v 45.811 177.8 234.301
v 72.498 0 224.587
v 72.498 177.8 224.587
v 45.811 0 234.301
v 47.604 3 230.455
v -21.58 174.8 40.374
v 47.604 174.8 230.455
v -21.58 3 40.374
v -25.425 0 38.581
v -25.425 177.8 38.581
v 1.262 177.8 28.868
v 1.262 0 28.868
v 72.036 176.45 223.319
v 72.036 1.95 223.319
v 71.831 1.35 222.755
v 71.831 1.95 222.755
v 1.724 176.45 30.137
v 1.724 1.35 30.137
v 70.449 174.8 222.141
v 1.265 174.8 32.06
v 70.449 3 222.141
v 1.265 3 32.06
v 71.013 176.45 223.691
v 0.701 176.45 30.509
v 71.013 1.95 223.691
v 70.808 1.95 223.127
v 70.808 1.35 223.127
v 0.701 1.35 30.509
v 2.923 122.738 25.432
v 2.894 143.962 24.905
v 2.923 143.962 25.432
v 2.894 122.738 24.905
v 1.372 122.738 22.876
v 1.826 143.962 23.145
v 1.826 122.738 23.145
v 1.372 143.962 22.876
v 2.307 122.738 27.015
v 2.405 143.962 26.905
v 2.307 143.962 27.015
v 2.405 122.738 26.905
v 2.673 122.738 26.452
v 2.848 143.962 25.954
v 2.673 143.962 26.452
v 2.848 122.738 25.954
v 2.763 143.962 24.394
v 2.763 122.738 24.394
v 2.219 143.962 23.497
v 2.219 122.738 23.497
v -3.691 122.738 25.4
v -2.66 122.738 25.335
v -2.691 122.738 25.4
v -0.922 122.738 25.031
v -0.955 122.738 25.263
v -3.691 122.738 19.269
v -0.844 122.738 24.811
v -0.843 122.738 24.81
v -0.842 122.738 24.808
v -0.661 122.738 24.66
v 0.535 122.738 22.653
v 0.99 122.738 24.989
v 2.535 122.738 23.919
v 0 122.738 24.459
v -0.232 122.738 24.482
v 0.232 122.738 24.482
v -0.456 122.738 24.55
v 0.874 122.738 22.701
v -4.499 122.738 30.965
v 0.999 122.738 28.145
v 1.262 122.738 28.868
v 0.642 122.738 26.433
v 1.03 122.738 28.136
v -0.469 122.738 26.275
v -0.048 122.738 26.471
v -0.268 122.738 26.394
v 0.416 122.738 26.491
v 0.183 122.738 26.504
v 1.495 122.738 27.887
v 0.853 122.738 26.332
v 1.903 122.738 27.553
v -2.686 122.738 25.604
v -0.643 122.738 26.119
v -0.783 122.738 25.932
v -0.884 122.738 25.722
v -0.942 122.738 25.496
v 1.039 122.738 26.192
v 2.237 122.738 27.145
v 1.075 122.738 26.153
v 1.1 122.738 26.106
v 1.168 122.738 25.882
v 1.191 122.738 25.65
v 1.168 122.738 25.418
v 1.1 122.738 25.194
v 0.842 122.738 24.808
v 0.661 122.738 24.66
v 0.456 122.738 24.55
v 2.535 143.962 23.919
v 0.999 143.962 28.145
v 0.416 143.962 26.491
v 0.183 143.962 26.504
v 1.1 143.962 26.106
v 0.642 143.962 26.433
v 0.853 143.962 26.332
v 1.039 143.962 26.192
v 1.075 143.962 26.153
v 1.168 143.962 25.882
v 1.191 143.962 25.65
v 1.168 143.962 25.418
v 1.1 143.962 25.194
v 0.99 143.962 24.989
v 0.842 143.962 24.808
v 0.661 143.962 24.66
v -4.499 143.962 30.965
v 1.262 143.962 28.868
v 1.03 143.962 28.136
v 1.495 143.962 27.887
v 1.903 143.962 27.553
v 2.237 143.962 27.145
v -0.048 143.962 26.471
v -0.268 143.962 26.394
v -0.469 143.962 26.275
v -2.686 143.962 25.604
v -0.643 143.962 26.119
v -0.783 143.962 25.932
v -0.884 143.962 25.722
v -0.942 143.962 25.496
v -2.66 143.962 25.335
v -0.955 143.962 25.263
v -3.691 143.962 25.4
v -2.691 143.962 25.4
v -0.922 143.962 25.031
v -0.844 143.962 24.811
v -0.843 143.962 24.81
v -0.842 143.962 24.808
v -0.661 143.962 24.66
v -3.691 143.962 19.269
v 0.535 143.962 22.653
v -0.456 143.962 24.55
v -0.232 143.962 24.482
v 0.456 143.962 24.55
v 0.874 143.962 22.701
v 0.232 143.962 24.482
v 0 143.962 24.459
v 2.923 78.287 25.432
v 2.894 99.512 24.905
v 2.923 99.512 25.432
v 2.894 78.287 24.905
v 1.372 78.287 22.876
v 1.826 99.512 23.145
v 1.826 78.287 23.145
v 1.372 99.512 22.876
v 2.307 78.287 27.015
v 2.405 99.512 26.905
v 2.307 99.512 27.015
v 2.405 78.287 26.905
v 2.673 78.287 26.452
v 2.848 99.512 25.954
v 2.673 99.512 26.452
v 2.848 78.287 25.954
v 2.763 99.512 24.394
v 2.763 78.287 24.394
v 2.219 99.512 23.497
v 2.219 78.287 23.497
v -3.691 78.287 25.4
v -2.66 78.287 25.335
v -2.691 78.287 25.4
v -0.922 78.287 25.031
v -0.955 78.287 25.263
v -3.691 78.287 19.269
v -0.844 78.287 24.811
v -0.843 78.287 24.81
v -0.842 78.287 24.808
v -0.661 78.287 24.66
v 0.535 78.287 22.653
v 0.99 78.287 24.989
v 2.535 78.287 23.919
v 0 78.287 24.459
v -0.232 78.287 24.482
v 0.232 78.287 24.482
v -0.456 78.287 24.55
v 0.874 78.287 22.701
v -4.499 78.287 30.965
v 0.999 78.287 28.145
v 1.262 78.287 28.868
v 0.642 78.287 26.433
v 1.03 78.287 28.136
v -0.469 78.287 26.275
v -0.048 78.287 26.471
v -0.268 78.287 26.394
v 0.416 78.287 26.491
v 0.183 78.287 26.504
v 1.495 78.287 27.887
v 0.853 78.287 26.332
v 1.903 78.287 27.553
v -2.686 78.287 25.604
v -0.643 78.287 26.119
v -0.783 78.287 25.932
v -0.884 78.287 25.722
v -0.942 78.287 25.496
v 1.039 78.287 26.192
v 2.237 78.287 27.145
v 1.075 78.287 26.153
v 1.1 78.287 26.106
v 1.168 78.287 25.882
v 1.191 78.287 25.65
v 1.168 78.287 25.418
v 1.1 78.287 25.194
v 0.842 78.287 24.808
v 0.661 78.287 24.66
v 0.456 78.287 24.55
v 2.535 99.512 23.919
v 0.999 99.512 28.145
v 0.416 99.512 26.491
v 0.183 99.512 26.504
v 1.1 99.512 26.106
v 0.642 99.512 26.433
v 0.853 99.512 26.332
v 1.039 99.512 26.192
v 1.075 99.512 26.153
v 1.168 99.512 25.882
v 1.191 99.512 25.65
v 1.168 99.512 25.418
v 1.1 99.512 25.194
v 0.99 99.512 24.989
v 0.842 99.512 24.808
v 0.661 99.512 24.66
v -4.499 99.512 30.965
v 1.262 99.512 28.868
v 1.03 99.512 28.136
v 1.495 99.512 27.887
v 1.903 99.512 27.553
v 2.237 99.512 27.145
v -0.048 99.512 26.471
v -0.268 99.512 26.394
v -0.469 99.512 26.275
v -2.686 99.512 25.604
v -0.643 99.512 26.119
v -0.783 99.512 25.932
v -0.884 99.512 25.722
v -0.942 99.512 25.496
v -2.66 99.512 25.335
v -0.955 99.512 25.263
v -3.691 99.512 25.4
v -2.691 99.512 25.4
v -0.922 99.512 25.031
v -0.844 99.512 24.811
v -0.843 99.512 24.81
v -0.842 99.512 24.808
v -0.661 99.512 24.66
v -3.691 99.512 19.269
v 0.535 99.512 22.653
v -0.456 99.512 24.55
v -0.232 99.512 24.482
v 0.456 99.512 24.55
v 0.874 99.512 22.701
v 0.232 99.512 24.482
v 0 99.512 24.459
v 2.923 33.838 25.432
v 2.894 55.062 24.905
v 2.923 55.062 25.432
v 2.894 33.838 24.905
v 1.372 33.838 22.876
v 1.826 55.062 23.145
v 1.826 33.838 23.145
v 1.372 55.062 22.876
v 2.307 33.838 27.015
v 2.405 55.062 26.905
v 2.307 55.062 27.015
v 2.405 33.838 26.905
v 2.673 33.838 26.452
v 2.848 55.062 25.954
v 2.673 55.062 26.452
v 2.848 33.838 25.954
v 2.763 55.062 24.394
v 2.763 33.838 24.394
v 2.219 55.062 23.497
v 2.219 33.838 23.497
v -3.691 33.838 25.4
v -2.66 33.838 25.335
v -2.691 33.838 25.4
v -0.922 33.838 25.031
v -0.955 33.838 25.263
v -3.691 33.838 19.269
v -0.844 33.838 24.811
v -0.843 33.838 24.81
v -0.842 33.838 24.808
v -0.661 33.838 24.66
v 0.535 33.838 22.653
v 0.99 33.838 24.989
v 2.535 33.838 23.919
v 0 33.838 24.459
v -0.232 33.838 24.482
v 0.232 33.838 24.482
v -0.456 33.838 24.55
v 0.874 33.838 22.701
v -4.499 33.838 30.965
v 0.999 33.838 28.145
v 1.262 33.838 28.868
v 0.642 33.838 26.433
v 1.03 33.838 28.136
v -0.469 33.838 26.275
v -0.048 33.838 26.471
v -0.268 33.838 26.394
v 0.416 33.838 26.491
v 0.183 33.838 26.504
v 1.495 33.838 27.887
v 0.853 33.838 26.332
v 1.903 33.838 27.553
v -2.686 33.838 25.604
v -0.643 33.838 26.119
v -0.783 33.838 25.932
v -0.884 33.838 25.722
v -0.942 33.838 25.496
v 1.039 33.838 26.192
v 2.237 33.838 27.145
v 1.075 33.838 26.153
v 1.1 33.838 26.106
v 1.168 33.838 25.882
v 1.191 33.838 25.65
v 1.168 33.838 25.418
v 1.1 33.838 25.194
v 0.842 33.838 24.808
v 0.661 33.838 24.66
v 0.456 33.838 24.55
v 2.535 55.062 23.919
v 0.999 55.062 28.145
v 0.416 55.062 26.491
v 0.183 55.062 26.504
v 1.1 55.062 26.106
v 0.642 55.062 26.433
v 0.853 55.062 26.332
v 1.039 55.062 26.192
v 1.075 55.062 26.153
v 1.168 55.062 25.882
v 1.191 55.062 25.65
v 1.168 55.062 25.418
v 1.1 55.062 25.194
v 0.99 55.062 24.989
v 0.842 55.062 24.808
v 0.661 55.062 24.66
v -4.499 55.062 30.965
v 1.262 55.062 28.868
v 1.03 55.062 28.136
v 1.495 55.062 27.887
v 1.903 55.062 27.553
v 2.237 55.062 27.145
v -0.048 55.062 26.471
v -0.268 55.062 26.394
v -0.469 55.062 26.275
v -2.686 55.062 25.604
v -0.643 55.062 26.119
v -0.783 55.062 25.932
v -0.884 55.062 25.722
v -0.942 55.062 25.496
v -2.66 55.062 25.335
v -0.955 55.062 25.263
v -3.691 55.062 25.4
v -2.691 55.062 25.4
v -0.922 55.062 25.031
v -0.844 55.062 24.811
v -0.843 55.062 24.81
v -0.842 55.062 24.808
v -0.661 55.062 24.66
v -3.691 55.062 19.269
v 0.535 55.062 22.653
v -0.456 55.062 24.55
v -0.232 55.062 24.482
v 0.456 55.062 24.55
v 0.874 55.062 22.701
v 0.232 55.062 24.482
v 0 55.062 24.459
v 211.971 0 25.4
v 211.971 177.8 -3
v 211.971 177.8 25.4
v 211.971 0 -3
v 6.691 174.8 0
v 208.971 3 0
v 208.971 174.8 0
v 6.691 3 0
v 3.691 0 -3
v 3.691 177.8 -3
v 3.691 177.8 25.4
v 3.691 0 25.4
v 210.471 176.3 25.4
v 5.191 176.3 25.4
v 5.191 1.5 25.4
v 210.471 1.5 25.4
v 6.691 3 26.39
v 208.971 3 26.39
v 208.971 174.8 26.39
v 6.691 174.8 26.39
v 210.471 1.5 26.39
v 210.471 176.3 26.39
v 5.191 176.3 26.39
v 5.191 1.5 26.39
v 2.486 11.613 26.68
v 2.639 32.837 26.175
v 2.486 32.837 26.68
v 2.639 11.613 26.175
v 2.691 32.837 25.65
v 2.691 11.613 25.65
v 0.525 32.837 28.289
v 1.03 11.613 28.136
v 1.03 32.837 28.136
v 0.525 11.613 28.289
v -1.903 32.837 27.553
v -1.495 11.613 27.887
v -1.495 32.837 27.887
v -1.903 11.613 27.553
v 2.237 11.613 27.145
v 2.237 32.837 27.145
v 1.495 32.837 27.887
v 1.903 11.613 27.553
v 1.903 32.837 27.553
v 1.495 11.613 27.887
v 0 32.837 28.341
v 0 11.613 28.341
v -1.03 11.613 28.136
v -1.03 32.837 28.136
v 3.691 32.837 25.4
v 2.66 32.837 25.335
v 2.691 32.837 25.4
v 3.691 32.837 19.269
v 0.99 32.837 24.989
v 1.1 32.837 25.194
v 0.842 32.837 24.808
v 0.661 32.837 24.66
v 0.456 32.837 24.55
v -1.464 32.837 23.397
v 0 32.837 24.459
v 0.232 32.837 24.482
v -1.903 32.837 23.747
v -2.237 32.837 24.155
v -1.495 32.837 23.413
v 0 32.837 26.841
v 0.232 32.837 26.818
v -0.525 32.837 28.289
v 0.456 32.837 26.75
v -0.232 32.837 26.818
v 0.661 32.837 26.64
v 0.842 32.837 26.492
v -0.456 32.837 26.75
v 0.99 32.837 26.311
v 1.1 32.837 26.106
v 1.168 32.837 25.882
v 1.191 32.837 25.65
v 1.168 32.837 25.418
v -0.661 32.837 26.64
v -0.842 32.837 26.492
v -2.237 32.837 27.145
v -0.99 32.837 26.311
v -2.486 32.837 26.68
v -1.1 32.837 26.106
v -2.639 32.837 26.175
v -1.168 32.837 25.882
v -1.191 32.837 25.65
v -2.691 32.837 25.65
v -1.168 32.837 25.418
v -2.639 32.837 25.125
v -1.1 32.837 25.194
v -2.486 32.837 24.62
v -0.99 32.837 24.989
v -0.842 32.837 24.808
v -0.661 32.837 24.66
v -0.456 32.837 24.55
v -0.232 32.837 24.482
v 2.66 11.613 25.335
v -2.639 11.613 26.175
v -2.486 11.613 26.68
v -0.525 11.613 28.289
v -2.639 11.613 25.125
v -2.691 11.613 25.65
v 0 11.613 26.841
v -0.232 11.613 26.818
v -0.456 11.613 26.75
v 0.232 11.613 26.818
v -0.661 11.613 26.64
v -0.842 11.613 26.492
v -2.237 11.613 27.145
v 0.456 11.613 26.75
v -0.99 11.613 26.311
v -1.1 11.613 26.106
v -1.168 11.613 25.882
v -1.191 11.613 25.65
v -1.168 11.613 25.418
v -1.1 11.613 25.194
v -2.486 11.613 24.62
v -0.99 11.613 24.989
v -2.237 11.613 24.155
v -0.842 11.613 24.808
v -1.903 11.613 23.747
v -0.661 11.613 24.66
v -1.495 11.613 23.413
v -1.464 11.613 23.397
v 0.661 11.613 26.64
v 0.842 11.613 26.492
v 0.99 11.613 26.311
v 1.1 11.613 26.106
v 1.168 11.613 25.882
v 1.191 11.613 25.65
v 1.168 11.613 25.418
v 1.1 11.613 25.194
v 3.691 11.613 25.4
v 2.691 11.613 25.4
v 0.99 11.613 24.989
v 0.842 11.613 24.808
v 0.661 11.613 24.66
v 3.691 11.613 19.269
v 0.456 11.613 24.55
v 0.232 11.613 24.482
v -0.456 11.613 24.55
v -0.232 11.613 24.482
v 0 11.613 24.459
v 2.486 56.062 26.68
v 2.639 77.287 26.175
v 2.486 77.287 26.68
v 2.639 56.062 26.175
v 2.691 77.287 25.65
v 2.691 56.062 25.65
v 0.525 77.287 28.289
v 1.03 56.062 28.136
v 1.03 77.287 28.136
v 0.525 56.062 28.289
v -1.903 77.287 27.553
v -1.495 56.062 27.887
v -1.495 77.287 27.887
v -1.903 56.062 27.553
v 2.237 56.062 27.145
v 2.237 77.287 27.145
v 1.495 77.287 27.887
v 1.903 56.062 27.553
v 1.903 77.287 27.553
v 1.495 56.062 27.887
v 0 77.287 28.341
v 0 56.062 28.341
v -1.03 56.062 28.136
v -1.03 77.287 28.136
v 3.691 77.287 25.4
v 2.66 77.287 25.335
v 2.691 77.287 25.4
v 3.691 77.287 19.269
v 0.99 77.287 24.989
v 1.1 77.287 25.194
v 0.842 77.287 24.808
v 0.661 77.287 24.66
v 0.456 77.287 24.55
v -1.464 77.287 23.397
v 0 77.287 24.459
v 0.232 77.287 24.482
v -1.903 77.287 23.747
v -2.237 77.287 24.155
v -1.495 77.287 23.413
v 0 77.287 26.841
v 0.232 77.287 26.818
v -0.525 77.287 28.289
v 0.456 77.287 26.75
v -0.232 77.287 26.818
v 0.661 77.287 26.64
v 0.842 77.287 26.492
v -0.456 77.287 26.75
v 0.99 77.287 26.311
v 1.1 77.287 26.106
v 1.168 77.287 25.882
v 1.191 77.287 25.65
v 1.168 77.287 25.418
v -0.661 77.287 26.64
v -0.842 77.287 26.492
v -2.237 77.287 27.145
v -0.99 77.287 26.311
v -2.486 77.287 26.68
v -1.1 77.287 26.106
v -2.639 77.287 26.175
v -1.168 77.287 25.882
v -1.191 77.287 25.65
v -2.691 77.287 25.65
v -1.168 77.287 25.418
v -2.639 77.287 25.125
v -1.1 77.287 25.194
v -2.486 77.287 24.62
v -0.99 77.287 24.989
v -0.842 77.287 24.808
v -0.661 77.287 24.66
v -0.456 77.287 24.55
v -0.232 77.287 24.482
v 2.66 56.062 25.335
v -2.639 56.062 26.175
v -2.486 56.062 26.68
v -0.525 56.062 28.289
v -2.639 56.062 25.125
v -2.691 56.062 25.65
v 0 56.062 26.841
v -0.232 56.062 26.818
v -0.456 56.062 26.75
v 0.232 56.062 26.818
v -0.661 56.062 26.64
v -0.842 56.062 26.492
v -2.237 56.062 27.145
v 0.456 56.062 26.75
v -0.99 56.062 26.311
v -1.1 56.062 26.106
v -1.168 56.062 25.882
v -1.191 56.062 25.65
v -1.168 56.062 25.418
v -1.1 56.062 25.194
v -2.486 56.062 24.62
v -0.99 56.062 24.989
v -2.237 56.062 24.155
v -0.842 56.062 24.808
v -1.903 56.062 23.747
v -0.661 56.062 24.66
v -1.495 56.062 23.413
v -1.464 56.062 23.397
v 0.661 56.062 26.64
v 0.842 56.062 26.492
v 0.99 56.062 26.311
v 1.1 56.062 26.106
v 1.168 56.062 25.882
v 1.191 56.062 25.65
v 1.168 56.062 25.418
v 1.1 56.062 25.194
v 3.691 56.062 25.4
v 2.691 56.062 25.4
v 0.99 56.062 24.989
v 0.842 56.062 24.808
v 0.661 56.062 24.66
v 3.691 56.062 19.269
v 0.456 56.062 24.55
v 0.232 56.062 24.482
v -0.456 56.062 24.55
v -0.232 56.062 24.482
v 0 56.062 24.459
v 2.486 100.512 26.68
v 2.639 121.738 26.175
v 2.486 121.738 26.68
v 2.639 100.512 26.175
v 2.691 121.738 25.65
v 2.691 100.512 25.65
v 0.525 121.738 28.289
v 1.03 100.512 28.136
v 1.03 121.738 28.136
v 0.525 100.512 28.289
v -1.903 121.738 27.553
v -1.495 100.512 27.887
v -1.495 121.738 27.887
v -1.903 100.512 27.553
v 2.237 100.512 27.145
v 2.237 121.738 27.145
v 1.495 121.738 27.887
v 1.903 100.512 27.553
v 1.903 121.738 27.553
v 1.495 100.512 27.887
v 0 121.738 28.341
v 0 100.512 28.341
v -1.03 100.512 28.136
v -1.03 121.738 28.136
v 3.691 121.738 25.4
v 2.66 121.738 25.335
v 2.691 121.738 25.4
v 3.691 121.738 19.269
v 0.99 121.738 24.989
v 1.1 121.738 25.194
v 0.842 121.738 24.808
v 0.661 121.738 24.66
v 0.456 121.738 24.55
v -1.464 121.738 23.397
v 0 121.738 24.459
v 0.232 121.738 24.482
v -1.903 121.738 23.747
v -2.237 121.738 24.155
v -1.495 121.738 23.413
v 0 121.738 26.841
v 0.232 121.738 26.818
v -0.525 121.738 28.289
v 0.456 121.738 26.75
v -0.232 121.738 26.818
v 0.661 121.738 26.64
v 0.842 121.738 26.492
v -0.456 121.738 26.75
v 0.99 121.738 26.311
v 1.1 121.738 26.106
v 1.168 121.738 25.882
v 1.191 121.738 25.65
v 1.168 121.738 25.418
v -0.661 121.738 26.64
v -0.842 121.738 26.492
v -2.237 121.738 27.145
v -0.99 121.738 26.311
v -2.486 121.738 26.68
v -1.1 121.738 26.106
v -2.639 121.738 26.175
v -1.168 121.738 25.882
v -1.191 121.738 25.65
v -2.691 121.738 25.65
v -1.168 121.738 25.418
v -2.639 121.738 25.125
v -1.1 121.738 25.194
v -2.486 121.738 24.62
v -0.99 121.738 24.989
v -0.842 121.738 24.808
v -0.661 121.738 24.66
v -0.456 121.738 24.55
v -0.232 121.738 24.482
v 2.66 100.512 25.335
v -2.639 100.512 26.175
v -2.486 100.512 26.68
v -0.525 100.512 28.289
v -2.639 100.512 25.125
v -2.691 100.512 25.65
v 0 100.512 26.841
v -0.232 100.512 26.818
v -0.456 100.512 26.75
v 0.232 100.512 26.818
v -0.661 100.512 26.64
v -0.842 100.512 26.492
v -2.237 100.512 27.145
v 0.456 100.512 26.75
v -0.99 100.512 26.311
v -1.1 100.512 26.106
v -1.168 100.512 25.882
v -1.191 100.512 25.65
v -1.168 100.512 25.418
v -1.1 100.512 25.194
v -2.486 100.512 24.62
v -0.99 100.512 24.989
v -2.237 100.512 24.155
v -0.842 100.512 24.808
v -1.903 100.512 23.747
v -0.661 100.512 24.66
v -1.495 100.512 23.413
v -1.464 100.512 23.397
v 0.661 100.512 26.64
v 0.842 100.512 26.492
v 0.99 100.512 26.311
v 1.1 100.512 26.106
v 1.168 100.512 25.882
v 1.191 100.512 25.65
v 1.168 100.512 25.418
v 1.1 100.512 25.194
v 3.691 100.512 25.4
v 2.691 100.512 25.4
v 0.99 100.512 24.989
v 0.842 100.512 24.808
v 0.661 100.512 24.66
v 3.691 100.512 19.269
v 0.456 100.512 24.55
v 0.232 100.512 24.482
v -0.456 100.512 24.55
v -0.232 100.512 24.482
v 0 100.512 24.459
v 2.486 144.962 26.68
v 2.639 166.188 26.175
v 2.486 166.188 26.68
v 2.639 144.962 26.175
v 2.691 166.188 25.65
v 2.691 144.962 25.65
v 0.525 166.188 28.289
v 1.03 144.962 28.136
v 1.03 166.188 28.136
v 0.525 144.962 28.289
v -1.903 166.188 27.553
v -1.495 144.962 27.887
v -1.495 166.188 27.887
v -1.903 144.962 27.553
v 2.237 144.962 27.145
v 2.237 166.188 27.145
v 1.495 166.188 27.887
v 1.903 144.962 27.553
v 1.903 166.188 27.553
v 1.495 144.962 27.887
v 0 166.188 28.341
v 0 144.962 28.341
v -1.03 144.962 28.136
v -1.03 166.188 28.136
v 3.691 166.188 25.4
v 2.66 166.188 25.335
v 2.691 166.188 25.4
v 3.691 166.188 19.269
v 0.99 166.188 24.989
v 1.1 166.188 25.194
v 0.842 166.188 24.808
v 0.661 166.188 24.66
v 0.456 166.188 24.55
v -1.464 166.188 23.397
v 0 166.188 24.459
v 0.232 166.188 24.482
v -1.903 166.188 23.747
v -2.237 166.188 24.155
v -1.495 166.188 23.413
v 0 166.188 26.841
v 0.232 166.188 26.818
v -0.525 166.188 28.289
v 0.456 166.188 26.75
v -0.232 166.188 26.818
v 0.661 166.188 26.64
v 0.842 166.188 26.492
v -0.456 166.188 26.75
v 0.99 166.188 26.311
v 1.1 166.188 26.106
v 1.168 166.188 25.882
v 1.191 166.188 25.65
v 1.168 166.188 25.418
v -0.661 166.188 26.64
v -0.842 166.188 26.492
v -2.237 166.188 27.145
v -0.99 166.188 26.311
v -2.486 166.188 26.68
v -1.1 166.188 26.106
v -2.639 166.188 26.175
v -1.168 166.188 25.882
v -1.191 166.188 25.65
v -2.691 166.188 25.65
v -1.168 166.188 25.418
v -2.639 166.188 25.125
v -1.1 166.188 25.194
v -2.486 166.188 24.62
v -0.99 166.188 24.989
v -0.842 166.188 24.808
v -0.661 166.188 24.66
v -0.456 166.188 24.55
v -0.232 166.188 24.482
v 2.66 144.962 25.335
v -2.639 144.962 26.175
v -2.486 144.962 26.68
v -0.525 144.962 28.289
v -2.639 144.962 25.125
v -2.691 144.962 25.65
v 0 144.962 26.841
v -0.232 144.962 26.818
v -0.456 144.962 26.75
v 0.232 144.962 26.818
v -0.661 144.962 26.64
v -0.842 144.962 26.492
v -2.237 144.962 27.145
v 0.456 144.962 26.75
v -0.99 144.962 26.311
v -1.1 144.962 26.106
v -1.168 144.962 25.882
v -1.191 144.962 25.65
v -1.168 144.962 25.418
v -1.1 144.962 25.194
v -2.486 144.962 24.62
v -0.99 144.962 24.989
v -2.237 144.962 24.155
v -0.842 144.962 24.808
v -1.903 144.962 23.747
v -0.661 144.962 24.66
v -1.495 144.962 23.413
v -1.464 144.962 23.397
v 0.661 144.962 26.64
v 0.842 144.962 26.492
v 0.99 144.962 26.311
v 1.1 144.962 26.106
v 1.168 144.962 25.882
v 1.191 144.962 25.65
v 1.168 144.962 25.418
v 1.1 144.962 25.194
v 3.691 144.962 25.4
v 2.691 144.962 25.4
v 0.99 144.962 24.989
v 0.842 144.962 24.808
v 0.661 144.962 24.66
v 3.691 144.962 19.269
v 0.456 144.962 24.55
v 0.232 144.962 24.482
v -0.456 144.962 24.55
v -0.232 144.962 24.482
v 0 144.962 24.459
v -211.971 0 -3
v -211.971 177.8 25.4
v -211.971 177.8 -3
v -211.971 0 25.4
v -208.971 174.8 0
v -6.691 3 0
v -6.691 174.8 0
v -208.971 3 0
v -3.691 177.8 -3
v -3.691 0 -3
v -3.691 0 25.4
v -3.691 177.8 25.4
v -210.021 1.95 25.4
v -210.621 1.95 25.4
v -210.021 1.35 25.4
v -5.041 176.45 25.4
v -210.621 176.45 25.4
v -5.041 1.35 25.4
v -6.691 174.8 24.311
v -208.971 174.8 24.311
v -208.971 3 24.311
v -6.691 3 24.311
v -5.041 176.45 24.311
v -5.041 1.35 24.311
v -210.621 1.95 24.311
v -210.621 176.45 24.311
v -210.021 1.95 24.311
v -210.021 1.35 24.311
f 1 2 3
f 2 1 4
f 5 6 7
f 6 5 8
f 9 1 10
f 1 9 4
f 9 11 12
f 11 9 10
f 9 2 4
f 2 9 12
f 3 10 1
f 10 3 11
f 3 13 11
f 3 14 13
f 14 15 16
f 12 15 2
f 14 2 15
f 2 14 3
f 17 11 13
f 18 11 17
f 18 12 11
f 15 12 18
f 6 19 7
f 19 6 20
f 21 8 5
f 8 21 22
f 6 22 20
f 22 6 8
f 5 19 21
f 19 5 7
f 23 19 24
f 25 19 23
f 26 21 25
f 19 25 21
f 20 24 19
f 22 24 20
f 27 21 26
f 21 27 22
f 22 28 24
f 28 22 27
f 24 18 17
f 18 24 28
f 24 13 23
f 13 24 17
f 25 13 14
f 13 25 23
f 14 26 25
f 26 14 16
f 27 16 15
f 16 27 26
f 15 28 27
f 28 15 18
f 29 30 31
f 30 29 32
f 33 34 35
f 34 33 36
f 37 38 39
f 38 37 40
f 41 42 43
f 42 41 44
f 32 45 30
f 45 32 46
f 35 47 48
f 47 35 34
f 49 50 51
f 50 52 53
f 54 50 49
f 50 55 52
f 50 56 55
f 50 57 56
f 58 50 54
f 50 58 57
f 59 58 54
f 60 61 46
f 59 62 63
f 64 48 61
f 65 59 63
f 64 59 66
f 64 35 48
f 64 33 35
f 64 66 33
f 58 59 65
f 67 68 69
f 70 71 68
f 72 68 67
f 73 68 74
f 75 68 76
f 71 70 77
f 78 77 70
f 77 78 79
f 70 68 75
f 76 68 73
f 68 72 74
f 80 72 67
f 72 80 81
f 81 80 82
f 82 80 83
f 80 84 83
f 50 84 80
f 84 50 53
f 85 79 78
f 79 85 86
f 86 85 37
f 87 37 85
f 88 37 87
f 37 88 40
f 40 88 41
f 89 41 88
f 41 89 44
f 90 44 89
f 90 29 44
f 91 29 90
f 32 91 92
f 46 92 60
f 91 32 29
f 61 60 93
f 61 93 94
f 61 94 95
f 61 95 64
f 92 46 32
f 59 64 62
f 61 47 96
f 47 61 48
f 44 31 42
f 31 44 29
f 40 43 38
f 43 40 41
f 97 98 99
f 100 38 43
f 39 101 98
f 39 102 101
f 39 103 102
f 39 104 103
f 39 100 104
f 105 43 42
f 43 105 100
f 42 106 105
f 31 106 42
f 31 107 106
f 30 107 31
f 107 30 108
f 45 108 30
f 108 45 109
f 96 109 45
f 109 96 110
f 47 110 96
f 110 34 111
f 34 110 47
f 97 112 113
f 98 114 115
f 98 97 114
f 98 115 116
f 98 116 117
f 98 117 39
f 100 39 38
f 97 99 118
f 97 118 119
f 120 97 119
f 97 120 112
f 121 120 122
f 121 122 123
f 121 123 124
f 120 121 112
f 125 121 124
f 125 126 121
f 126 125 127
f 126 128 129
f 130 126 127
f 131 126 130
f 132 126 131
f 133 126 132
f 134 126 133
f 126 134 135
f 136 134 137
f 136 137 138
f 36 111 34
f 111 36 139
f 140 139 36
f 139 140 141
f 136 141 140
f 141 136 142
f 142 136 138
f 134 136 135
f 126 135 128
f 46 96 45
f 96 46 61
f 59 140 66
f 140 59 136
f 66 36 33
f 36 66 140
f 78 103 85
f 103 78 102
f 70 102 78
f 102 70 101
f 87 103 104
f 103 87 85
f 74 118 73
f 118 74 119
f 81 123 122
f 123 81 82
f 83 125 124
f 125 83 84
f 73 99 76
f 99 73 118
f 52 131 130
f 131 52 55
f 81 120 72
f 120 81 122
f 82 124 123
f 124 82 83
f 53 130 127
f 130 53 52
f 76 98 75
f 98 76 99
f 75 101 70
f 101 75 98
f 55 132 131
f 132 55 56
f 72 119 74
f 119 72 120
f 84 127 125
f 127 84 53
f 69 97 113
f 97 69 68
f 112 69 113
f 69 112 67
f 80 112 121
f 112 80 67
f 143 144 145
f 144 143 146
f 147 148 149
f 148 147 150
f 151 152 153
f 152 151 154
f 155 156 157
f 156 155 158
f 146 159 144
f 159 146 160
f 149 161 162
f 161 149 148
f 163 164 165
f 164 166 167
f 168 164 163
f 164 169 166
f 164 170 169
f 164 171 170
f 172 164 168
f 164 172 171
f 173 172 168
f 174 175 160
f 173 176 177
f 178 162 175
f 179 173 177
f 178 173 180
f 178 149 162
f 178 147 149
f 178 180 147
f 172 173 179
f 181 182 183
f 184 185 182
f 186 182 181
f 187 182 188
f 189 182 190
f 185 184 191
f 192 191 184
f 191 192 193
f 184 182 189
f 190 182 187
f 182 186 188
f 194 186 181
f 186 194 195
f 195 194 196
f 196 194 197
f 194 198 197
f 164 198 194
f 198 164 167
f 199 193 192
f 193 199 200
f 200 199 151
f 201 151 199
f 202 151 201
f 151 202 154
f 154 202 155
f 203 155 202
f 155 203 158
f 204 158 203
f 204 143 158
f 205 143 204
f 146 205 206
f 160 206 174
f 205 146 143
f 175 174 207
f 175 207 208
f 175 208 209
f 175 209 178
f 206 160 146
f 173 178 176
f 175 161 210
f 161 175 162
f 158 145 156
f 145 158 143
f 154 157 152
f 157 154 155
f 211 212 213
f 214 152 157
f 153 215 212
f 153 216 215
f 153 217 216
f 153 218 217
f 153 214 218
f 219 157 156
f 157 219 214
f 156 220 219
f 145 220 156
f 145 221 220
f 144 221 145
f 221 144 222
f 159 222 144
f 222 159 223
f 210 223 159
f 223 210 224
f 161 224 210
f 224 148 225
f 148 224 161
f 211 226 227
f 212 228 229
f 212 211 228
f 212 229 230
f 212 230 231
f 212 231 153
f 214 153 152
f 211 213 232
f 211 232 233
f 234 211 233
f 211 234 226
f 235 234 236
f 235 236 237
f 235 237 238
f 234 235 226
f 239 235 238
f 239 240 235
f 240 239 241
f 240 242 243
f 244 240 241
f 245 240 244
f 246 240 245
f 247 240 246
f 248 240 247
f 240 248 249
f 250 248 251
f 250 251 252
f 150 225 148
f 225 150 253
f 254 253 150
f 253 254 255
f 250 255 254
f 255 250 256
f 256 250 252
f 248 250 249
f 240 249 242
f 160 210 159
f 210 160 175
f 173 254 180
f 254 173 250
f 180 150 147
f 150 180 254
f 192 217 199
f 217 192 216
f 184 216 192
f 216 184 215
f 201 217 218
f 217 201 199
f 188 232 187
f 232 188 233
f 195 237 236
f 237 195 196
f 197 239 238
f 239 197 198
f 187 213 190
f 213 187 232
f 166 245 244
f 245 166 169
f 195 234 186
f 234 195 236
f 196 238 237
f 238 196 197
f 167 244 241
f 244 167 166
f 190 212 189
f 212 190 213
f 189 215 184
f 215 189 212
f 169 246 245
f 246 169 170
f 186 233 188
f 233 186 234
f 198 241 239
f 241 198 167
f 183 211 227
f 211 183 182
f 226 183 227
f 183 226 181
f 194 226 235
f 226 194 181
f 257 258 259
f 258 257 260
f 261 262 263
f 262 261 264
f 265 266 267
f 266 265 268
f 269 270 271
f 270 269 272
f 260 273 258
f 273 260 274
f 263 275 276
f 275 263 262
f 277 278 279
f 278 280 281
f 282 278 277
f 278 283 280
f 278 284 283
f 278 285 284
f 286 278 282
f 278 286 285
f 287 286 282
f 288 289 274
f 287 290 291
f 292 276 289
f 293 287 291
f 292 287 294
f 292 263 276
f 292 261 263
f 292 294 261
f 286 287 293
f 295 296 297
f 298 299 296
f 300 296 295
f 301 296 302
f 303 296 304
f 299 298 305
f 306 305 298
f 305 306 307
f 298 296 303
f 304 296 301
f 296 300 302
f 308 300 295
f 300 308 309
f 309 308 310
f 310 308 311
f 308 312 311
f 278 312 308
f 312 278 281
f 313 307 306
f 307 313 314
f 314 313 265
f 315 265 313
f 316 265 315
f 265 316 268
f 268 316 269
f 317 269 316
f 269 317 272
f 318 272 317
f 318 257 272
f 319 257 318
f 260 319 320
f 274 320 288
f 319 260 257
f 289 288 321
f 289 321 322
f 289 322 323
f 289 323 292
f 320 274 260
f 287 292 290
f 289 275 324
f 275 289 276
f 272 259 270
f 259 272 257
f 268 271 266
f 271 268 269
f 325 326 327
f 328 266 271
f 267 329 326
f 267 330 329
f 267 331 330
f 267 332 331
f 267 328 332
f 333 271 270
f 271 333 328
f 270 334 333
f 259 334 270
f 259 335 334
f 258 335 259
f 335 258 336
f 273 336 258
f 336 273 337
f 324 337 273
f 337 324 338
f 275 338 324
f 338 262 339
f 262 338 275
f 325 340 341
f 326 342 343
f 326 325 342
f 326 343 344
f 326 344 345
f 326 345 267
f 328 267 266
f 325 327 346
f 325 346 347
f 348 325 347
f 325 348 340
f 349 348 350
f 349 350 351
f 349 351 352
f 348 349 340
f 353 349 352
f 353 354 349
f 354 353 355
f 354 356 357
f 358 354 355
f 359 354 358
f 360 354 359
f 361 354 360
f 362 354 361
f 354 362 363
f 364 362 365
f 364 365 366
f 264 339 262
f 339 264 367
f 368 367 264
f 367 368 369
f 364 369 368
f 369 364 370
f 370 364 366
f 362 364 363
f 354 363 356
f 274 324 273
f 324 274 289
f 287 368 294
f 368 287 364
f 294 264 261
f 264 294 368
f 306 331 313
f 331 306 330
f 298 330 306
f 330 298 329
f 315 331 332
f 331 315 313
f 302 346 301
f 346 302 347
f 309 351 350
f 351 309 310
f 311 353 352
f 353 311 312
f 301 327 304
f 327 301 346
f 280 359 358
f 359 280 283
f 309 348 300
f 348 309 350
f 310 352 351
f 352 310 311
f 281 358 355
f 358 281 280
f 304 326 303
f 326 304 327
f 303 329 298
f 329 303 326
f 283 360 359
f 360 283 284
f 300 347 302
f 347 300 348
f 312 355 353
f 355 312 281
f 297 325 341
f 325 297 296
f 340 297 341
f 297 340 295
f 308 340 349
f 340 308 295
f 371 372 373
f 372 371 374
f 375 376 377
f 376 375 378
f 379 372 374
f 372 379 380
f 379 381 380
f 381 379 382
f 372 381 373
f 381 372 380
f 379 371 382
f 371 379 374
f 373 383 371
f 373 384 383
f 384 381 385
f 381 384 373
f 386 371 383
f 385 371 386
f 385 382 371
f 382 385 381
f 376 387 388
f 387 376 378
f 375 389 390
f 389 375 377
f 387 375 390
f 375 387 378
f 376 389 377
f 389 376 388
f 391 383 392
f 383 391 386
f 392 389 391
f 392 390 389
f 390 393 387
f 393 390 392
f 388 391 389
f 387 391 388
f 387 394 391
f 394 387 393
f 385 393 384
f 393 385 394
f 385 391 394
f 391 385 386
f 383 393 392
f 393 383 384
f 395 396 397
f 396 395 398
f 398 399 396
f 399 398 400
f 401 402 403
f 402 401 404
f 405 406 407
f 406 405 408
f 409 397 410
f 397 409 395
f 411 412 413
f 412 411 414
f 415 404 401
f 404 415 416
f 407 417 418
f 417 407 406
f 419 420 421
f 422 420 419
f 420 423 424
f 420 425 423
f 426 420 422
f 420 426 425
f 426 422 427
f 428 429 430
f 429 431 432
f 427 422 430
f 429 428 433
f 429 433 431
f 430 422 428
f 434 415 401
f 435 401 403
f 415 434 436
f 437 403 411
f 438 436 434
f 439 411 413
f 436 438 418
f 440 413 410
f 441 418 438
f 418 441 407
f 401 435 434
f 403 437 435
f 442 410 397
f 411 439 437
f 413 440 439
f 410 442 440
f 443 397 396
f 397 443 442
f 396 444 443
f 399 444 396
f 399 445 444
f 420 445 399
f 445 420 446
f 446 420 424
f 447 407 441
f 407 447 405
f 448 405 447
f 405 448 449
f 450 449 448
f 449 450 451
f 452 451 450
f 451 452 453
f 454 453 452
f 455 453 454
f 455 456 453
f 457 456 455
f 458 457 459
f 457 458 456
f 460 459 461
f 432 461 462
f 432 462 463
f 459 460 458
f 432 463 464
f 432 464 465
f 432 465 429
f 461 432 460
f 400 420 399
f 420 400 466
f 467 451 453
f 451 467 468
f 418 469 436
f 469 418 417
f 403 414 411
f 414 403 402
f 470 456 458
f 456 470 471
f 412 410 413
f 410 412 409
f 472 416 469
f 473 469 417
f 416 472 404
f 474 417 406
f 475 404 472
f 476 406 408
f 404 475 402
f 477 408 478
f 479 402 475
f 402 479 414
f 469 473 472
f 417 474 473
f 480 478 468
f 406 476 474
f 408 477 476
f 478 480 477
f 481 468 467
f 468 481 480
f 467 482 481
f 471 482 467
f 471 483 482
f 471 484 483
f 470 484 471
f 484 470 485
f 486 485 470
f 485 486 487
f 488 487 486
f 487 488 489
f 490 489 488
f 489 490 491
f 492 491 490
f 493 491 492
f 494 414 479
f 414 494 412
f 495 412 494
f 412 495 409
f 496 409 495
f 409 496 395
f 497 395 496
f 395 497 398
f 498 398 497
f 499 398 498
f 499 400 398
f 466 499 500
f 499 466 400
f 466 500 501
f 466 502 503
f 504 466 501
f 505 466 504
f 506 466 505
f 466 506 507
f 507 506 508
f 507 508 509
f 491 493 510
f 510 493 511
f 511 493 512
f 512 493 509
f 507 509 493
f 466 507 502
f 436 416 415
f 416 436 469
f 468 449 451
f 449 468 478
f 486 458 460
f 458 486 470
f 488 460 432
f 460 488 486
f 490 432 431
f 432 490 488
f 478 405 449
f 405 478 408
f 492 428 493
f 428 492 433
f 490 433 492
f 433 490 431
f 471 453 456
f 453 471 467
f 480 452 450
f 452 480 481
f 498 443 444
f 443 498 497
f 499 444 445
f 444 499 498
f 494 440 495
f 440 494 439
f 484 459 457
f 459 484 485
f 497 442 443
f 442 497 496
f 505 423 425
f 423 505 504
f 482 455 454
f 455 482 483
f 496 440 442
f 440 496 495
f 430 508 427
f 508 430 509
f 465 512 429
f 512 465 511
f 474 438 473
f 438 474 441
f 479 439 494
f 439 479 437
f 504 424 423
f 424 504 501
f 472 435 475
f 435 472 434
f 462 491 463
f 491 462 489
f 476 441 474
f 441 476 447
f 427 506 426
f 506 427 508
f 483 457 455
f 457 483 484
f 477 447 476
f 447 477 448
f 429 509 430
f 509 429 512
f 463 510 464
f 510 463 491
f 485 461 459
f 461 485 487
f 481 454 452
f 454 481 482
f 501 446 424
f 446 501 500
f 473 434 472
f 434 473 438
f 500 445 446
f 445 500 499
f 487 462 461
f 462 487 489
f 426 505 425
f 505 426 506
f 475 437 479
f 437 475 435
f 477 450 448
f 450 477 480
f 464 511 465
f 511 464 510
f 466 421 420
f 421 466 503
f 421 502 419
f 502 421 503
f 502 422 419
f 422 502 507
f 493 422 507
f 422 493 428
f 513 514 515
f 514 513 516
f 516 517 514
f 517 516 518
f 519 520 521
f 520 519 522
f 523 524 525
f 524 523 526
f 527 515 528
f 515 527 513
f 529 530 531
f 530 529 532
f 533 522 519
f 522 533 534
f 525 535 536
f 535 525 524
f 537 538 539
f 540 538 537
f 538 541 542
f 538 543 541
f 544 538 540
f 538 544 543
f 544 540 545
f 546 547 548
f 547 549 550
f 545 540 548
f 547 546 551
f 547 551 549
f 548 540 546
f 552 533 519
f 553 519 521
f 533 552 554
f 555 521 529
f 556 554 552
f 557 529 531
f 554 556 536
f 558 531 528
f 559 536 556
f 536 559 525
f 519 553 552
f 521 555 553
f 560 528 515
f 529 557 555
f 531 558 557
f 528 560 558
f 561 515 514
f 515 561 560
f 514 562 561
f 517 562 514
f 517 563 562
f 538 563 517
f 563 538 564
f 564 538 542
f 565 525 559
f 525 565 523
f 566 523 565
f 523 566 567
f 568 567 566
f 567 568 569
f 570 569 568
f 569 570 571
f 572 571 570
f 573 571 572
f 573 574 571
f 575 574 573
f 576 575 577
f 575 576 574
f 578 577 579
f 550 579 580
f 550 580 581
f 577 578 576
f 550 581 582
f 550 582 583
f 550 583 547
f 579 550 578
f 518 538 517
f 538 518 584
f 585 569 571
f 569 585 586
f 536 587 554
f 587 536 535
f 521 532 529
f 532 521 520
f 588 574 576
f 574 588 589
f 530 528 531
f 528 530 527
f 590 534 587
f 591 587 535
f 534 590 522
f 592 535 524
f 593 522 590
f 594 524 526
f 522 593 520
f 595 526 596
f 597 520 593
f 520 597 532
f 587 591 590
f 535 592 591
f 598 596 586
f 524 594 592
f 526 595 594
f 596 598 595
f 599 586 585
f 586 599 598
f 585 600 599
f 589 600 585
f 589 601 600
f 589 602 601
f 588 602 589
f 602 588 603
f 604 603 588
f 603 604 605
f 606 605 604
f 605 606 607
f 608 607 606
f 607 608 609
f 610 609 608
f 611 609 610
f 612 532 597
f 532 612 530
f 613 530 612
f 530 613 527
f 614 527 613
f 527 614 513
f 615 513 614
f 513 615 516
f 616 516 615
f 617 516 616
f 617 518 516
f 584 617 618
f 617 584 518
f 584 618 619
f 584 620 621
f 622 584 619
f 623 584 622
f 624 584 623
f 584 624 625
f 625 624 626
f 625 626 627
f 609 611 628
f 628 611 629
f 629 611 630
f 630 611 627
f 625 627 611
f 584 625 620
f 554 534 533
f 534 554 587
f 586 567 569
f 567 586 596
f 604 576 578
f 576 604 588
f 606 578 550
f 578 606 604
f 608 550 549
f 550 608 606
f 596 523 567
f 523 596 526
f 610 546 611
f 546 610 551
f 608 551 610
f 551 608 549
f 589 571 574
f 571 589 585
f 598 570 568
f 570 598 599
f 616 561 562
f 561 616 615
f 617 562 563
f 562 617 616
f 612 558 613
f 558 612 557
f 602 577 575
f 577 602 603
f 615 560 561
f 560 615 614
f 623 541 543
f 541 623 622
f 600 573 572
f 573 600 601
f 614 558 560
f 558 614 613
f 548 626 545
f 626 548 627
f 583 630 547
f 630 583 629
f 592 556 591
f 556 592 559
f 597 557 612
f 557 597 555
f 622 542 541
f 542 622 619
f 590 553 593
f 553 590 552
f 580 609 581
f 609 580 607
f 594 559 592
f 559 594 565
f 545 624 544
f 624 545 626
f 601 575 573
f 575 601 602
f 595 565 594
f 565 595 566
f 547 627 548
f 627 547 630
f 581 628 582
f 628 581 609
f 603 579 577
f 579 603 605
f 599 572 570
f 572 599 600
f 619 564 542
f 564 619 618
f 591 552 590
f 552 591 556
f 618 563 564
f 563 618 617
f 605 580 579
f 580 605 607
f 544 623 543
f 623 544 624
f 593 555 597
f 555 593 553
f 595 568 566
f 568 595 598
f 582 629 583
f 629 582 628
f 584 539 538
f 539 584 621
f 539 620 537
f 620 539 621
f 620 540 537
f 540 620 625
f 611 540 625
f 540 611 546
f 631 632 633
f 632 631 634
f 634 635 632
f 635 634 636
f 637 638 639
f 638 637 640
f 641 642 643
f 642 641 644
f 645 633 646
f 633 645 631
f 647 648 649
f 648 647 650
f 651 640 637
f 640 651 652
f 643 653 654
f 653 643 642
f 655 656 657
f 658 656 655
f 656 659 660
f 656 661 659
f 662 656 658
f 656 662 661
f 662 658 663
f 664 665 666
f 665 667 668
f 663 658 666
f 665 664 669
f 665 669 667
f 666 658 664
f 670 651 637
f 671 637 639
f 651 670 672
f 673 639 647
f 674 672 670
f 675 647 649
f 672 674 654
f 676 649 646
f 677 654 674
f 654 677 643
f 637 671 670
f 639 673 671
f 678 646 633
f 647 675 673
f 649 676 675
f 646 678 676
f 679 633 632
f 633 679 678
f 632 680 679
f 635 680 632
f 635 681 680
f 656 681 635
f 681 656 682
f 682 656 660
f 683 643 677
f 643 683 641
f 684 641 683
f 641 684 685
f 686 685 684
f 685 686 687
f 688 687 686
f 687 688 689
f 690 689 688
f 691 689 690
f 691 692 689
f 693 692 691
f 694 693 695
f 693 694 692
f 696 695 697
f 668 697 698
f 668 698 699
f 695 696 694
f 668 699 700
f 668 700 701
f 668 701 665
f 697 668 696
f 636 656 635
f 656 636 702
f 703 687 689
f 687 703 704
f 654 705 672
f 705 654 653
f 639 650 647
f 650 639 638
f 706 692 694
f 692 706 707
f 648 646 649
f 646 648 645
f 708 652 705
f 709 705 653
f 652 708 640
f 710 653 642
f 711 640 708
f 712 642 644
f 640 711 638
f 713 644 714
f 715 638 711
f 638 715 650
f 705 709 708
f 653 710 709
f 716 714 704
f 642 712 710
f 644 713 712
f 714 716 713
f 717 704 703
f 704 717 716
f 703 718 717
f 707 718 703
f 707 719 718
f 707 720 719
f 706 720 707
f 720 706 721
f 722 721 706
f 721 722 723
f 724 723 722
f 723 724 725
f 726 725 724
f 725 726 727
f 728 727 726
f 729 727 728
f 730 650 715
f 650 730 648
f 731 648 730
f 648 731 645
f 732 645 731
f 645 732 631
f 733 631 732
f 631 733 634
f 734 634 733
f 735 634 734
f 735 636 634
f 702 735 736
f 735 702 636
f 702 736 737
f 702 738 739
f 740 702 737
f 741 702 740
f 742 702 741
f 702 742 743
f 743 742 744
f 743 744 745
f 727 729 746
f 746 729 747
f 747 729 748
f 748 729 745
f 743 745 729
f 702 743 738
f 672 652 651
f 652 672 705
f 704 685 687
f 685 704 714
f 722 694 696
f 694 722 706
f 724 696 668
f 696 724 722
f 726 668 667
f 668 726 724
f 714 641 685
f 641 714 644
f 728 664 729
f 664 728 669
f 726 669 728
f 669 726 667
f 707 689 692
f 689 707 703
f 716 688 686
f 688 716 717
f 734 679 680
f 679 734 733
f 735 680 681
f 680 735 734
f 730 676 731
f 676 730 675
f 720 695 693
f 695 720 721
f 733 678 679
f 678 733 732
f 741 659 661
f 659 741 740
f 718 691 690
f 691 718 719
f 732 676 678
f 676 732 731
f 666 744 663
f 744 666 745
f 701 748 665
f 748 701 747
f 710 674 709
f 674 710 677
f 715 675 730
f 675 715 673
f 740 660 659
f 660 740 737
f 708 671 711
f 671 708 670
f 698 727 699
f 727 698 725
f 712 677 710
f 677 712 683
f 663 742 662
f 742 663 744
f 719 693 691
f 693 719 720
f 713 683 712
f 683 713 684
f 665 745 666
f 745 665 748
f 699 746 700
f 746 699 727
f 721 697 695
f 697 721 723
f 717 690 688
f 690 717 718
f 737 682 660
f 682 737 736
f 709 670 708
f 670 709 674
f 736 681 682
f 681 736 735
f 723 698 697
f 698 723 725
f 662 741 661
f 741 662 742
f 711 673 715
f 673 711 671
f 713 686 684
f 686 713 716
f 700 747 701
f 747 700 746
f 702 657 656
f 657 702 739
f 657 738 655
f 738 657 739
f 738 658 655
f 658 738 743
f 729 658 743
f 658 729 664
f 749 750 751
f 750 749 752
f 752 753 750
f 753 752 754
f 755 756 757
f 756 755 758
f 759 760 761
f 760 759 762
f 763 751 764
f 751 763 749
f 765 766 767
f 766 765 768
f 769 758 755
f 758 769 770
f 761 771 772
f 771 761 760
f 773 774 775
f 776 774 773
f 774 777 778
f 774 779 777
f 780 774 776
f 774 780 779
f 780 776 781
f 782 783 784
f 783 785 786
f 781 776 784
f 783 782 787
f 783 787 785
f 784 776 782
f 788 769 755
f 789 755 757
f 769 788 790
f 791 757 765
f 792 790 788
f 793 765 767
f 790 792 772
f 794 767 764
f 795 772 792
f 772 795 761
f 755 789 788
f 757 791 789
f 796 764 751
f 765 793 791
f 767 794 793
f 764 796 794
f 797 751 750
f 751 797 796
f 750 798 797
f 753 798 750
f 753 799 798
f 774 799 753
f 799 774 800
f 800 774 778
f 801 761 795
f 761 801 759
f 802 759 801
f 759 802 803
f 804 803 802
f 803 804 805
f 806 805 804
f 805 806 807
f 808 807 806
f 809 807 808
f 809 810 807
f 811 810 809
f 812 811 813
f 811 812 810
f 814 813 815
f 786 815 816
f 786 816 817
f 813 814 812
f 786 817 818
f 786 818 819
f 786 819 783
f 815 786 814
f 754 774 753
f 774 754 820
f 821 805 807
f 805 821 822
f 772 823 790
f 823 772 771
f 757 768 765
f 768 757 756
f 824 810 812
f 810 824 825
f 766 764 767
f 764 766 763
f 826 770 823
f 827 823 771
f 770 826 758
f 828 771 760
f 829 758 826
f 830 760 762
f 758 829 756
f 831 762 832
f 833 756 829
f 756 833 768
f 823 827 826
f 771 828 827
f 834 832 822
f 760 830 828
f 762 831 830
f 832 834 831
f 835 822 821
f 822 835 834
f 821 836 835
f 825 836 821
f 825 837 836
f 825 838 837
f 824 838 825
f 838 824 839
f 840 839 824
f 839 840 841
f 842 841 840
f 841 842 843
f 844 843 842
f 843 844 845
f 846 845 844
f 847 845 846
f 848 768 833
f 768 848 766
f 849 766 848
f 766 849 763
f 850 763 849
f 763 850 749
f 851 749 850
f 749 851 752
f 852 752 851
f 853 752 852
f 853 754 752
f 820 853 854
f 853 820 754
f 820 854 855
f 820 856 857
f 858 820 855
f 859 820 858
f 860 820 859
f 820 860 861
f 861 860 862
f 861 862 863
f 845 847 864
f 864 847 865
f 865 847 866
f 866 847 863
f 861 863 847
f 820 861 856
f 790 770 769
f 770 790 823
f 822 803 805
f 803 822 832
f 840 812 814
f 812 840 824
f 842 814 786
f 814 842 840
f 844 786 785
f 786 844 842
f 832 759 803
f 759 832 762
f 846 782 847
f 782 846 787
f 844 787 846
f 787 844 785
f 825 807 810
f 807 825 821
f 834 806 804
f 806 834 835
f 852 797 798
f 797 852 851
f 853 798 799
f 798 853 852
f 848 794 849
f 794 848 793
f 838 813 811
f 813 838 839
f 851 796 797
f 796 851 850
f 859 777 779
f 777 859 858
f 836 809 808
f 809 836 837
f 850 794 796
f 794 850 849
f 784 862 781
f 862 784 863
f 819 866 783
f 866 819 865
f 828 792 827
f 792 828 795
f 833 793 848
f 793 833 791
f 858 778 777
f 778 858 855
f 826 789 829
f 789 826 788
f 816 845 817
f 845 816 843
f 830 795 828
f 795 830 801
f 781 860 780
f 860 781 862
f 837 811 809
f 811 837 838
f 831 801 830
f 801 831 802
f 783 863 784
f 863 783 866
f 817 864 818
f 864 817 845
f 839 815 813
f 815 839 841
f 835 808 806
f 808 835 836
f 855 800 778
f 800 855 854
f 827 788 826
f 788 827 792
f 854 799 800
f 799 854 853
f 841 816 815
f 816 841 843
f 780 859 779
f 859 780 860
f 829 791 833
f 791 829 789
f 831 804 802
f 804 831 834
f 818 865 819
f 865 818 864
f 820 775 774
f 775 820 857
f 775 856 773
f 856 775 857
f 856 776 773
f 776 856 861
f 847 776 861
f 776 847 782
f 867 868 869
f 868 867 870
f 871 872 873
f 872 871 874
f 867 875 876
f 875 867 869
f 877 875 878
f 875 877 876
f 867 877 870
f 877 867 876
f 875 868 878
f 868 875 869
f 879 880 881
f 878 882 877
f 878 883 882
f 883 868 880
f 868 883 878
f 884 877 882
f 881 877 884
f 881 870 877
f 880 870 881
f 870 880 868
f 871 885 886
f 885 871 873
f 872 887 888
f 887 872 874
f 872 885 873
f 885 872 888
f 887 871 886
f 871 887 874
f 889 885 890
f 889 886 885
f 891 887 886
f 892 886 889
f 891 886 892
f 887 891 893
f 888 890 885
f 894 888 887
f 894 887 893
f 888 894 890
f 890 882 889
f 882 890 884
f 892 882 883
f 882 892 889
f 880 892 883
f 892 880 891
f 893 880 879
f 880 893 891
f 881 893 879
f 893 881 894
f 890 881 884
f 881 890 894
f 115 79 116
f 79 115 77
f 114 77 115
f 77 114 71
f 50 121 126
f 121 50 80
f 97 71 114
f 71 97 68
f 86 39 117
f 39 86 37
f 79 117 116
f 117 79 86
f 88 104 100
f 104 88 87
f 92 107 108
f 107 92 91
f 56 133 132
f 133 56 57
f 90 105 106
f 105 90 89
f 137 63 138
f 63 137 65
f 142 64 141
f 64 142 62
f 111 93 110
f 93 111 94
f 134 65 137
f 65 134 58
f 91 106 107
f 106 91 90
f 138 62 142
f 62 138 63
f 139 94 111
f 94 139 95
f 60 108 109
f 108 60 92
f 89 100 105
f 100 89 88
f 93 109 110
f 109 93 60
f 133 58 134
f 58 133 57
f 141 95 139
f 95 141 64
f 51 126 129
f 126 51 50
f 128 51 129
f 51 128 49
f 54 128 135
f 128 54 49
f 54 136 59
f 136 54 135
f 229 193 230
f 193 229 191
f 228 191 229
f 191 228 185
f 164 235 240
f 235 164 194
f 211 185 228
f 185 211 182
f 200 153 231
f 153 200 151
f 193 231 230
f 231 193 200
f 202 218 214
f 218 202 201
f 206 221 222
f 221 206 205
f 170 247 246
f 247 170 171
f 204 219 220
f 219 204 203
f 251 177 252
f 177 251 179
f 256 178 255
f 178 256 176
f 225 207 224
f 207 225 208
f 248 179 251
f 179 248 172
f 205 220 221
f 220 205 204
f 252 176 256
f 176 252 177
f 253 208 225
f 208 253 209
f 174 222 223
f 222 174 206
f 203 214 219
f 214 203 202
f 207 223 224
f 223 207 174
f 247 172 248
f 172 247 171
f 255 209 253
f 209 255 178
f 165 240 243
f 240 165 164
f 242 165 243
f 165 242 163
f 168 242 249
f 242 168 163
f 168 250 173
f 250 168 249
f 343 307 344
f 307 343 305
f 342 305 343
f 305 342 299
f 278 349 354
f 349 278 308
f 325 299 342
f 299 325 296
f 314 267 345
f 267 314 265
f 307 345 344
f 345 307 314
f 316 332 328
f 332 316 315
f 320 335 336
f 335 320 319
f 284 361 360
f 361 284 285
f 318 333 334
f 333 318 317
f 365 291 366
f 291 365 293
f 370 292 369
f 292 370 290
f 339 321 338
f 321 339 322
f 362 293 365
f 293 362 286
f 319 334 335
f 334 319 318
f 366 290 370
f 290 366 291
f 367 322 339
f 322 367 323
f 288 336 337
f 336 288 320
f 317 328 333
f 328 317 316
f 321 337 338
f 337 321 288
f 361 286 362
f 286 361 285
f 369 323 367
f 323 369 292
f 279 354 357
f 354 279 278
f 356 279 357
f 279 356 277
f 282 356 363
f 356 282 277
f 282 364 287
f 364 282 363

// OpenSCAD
/*
 * Modules for hinged boxes of a given size.
 * It would be nice if this was a fully parametrized model,
 * but for now, just changing the values of x, y, thickness,
 * and height directly in the code suffices.  
*/



// Print bed size: 250mm x, 210mm y
//cube([250, 210, 1]);

//module import_book_charkha_file(name) {
//    import(str("Book_Charkha_centered", "/", name));
//}

function inch_to_mm(inches) = inches * 25.4;

// Teeny dimensions
//x = inch_to_mm(3);
//y = inch_to_mm((7 / 8.2) * 3);

// Larger dimensions
x = inch_to_mm(8.2);
y = inch_to_mm(7);
thickness = 3;
height = inch_to_mm(1) + thickness;

hinge_true_length = y / 8;

hinge_length = hinge_true_length - 1;
//total_hinge_length = 2 * hinge_length;
hinge_radius = (inch_to_mm(3/32) + thickness) / 2;
hinge_inner_radius = inch_to_mm(3/32) / 2;


hinge_y1 = y - (5 * hinge_true_length);

hinge_half_length = hinge_length / 2;

hinge_height_diff = 0.25;

latcher_attacher_points = [
    [cos(225) * hinge_radius,    -hinge_half_length, sin(225) * hinge_radius],                 // 0
    [cos(225) * hinge_radius,    hinge_half_length,  sin(225) * hinge_radius],                 // 1
    [cos(-45) * hinge_radius, -hinge_half_length, sin(-45) * hinge_radius],
    [cos(-45) * hinge_radius, hinge_half_length, sin(-45) * hinge_radius],
    [hinge_radius, hinge_half_length, -hinge_height_diff], // 2 -> 4
    [hinge_radius, -hinge_half_length, -hinge_height_diff], // 3 -> 5
    [hinge_radius + 1, hinge_half_length,  -hinge_height_diff],                 // 4 -> 6
    [hinge_radius + 1, -hinge_half_length, -hinge_height_diff],                 // 5 -> 7
    [hinge_radius + 1, -hinge_half_length, -2 * hinge_radius - 1], // 6 -> 8
    [hinge_radius + 1, hinge_half_length, -2 * hinge_radius - 1]   // 7 -> 9
];

latcher_attacher_faces = [
    [0, 1, 3, 2],
    [2, 3, 4, 5],
    [5, 4, 6, 7],
    [7, 6, 9, 8],
    [1, 0, 8, 9],
    [0, 2, 5, 7, 8],
    [1, 9, 6, 4, 3]
];


module latcher(){
//        union() {
    difference() {
        rotate([90, 0, 0]) cylinder(h=hinge_length, r=hinge_radius, center=true, $fn=32);
        rotate([90, 0, 0]) cylinder(h=hinge_length, r=hinge_inner_radius, center=true, $fn=32);
    }
    
                
//            difference() {
    polyhedron(points=latcher_attacher_points, faces=latcher_attacher_faces);
//                rotate([90, 0, 0]) cylinder(h=hinge_length, r=hinge_inner_radius, center=true, $fn=32);
//            }
//        }
        

}


lip_thickness = 0.5 * thickness;
lip_height = 0.66 * lip_thickness;
module lip(thickness_scale=1.0) {
    lt = lip_thickness * thickness_scale;
    lh = lip_height * thickness_scale;
    inset = thickness - lt;
    translate([inset, inset, height - lh]) cube([x - 2 * lt, lt, 2 * lh]);
    translate([inset, inset, height - lh]) cube([lt, y - 2 * lt, 2 * lh]);
    translate([x - thickness, inset, height - lh]) cube([lt, y - 2 * lt, 2 * lh]);
    translate([inset, y - thickness, height - lh]) cube([x - 2 * lt, lt, 2 * lh]);
}

module box_half(){
    cube([x, y, thickness]);
    

    // long side 1
    cube([x, thickness, height]);
    // long side 2
    translate([0, y - thickness, 0]) cube([x, thickness, height]);

    // short side 1
    cube([thickness, y, height]);
    // short side 2
    translate([x - thickness, 0, 0]) cube([thickness, y, height]);
}

latch_height = height + hinge_height_diff;

module box_bottom() {
    translate([hinge_radius + 1, 0, 0]) {
//        difference() {
            box_half();
            lip();
//        }
    }
    translate([0, hinge_y1 - 2 * hinge_true_length, latch_height]) latcher();
    translate([0, hinge_y1, latch_height]) latcher();
    translate([0, hinge_y1 + 2 * hinge_true_length, latch_height]) latcher();
    translate([0, hinge_y1 + 4 * hinge_true_length, latch_height]) latcher();
}

module box_top() {
    translate([hinge_radius + 1, 0, 0]) {
        difference() {
            box_half();
            lip(thickness_scale=1.1);
        }
//        lip();
    }
    translate([0, hinge_y1 - hinge_true_length, latch_height]) latcher();
    translate([0, hinge_y1 + 1 * hinge_true_length, latch_height]) latcher();
    translate([0, hinge_y1 + 3 * hinge_true_length, latch_height]) latcher();
}

module open_box_top() {
    translate([-x * 0.5, y * 0.5, height * 0.5]) rotate([0, 0, 180]) translate([-x * 0.5, -y * 0.5, -height * 0.5]) box_top();
}



// Commented out these book charkha components. That's what the hinged box was originally for.
/*
module bearing_block() {
    import_book_charkha_file("Bearing_Block_3mm_hole.stl");
}

module large_pulley() {
    bearing_block();
    translate([0, 0, 18.4]) import_book_charkha_file("Large_Pulley_2_with_3.5mm_hole.stl");
}

module small_pulley() {
    bearing_block();
    translate([0, 0, 24 +  18.4]) rotate([180, 0, 0]) import_book_charkha_file("Small_pulley_2_3.5mm_hole.stl");
}

module spindle_holder_bottom() {
    import_book_charkha_file("Spindle_Holder_Bottom_Mark_IV.stl");
}

module spindle_holder_top() {
    import_book_charkha_file("Spindle_Holder_mark_v_3.stl");
}

//bearing_block();

// Spinning components
#translate([142, 109, 0]) large_pulley();
#translate([51, 49, 0]) small_pulley();
#translate([-120, 120, 0]) spindle_holder_bottom();
translate([-120, 147.5, 6.9]) translate([0, 0, 47.19 * 0.5]) rotate([0, 270, 90]) spindle_holder_top();
*/



//
//latcher();
//import("hinged_box_hinge.stl");
//union() {
//            rotate([90, 0, 0]) cylinder(h=hinge_length, r=hinge_radius, center=true, $fn=32);
//            polyhedron(points=latcher_attacher_points, faces=latcher_attacher_faces);
//        }

//polyhedron(points=latcher_attacher_points, faces=latcher_attacher_faces, convexity=4);




//polygon(points=[[0, -hinge_half_length], [0, hinge_half_length], [hinge_radius + 1, hinge_half_length], [hinge_radius + 1, -hinge_half_length]]);
//polyhedron(faces=[[0, -hinge_half_length, 0], [0, hinge_half_length, 0], [hinge_radius + 1, hinge_half_length, 0], [hinge_radius + 1, -hinge_half_length, 0]]);

//intersection() {
//    box_bottom();
//    translate([-3, 0, height * 0.7]) cube([10, 50, height * 0.5]);
//}

module openableBoxTop(open_angle=0) {
    translate([0, 0, height]) rotate([0, -open_angle, 0]) translate([x * 0.5, y * 0.5, height * 0.5]) rotate([180, 0, 0]) translate([-x * 0.5, -y * 0.5, -height * 0.5]) box_top();
}

translate([0, 0, -thickness]) #openableBoxTop(open_angle=70);


//#translate([x * 0.5, y * 0.5, height * 1.5]) rotate([180, 0, 0]) translate([-x * 0.5, -y * 0.5, -height * 0.5]) box_top();

//#translate([0, 0, 2 * height]) rotate([0, 0, 180]) translate([0, 0, -height]) box_top();

translate([0, 0, -thickness]) 
box_bottom();

translate([0, 0, -thickness]) 
open_box_top();

//translate([-x * 0.5, y * 0.5, height * 0.5]) rotate([0, 0, 180]) translate([-x * 0.5, -y * 0.5, -height * 0.5]) box_top();




//translate([hinge_radius + 1, 0, 0]) box_half();
////
////
//////hinge
//translate([0, hinge_y1, height]) latcher();
//translate([0, hinge_y1 + 2 * hinge_length, height]) latcher();
